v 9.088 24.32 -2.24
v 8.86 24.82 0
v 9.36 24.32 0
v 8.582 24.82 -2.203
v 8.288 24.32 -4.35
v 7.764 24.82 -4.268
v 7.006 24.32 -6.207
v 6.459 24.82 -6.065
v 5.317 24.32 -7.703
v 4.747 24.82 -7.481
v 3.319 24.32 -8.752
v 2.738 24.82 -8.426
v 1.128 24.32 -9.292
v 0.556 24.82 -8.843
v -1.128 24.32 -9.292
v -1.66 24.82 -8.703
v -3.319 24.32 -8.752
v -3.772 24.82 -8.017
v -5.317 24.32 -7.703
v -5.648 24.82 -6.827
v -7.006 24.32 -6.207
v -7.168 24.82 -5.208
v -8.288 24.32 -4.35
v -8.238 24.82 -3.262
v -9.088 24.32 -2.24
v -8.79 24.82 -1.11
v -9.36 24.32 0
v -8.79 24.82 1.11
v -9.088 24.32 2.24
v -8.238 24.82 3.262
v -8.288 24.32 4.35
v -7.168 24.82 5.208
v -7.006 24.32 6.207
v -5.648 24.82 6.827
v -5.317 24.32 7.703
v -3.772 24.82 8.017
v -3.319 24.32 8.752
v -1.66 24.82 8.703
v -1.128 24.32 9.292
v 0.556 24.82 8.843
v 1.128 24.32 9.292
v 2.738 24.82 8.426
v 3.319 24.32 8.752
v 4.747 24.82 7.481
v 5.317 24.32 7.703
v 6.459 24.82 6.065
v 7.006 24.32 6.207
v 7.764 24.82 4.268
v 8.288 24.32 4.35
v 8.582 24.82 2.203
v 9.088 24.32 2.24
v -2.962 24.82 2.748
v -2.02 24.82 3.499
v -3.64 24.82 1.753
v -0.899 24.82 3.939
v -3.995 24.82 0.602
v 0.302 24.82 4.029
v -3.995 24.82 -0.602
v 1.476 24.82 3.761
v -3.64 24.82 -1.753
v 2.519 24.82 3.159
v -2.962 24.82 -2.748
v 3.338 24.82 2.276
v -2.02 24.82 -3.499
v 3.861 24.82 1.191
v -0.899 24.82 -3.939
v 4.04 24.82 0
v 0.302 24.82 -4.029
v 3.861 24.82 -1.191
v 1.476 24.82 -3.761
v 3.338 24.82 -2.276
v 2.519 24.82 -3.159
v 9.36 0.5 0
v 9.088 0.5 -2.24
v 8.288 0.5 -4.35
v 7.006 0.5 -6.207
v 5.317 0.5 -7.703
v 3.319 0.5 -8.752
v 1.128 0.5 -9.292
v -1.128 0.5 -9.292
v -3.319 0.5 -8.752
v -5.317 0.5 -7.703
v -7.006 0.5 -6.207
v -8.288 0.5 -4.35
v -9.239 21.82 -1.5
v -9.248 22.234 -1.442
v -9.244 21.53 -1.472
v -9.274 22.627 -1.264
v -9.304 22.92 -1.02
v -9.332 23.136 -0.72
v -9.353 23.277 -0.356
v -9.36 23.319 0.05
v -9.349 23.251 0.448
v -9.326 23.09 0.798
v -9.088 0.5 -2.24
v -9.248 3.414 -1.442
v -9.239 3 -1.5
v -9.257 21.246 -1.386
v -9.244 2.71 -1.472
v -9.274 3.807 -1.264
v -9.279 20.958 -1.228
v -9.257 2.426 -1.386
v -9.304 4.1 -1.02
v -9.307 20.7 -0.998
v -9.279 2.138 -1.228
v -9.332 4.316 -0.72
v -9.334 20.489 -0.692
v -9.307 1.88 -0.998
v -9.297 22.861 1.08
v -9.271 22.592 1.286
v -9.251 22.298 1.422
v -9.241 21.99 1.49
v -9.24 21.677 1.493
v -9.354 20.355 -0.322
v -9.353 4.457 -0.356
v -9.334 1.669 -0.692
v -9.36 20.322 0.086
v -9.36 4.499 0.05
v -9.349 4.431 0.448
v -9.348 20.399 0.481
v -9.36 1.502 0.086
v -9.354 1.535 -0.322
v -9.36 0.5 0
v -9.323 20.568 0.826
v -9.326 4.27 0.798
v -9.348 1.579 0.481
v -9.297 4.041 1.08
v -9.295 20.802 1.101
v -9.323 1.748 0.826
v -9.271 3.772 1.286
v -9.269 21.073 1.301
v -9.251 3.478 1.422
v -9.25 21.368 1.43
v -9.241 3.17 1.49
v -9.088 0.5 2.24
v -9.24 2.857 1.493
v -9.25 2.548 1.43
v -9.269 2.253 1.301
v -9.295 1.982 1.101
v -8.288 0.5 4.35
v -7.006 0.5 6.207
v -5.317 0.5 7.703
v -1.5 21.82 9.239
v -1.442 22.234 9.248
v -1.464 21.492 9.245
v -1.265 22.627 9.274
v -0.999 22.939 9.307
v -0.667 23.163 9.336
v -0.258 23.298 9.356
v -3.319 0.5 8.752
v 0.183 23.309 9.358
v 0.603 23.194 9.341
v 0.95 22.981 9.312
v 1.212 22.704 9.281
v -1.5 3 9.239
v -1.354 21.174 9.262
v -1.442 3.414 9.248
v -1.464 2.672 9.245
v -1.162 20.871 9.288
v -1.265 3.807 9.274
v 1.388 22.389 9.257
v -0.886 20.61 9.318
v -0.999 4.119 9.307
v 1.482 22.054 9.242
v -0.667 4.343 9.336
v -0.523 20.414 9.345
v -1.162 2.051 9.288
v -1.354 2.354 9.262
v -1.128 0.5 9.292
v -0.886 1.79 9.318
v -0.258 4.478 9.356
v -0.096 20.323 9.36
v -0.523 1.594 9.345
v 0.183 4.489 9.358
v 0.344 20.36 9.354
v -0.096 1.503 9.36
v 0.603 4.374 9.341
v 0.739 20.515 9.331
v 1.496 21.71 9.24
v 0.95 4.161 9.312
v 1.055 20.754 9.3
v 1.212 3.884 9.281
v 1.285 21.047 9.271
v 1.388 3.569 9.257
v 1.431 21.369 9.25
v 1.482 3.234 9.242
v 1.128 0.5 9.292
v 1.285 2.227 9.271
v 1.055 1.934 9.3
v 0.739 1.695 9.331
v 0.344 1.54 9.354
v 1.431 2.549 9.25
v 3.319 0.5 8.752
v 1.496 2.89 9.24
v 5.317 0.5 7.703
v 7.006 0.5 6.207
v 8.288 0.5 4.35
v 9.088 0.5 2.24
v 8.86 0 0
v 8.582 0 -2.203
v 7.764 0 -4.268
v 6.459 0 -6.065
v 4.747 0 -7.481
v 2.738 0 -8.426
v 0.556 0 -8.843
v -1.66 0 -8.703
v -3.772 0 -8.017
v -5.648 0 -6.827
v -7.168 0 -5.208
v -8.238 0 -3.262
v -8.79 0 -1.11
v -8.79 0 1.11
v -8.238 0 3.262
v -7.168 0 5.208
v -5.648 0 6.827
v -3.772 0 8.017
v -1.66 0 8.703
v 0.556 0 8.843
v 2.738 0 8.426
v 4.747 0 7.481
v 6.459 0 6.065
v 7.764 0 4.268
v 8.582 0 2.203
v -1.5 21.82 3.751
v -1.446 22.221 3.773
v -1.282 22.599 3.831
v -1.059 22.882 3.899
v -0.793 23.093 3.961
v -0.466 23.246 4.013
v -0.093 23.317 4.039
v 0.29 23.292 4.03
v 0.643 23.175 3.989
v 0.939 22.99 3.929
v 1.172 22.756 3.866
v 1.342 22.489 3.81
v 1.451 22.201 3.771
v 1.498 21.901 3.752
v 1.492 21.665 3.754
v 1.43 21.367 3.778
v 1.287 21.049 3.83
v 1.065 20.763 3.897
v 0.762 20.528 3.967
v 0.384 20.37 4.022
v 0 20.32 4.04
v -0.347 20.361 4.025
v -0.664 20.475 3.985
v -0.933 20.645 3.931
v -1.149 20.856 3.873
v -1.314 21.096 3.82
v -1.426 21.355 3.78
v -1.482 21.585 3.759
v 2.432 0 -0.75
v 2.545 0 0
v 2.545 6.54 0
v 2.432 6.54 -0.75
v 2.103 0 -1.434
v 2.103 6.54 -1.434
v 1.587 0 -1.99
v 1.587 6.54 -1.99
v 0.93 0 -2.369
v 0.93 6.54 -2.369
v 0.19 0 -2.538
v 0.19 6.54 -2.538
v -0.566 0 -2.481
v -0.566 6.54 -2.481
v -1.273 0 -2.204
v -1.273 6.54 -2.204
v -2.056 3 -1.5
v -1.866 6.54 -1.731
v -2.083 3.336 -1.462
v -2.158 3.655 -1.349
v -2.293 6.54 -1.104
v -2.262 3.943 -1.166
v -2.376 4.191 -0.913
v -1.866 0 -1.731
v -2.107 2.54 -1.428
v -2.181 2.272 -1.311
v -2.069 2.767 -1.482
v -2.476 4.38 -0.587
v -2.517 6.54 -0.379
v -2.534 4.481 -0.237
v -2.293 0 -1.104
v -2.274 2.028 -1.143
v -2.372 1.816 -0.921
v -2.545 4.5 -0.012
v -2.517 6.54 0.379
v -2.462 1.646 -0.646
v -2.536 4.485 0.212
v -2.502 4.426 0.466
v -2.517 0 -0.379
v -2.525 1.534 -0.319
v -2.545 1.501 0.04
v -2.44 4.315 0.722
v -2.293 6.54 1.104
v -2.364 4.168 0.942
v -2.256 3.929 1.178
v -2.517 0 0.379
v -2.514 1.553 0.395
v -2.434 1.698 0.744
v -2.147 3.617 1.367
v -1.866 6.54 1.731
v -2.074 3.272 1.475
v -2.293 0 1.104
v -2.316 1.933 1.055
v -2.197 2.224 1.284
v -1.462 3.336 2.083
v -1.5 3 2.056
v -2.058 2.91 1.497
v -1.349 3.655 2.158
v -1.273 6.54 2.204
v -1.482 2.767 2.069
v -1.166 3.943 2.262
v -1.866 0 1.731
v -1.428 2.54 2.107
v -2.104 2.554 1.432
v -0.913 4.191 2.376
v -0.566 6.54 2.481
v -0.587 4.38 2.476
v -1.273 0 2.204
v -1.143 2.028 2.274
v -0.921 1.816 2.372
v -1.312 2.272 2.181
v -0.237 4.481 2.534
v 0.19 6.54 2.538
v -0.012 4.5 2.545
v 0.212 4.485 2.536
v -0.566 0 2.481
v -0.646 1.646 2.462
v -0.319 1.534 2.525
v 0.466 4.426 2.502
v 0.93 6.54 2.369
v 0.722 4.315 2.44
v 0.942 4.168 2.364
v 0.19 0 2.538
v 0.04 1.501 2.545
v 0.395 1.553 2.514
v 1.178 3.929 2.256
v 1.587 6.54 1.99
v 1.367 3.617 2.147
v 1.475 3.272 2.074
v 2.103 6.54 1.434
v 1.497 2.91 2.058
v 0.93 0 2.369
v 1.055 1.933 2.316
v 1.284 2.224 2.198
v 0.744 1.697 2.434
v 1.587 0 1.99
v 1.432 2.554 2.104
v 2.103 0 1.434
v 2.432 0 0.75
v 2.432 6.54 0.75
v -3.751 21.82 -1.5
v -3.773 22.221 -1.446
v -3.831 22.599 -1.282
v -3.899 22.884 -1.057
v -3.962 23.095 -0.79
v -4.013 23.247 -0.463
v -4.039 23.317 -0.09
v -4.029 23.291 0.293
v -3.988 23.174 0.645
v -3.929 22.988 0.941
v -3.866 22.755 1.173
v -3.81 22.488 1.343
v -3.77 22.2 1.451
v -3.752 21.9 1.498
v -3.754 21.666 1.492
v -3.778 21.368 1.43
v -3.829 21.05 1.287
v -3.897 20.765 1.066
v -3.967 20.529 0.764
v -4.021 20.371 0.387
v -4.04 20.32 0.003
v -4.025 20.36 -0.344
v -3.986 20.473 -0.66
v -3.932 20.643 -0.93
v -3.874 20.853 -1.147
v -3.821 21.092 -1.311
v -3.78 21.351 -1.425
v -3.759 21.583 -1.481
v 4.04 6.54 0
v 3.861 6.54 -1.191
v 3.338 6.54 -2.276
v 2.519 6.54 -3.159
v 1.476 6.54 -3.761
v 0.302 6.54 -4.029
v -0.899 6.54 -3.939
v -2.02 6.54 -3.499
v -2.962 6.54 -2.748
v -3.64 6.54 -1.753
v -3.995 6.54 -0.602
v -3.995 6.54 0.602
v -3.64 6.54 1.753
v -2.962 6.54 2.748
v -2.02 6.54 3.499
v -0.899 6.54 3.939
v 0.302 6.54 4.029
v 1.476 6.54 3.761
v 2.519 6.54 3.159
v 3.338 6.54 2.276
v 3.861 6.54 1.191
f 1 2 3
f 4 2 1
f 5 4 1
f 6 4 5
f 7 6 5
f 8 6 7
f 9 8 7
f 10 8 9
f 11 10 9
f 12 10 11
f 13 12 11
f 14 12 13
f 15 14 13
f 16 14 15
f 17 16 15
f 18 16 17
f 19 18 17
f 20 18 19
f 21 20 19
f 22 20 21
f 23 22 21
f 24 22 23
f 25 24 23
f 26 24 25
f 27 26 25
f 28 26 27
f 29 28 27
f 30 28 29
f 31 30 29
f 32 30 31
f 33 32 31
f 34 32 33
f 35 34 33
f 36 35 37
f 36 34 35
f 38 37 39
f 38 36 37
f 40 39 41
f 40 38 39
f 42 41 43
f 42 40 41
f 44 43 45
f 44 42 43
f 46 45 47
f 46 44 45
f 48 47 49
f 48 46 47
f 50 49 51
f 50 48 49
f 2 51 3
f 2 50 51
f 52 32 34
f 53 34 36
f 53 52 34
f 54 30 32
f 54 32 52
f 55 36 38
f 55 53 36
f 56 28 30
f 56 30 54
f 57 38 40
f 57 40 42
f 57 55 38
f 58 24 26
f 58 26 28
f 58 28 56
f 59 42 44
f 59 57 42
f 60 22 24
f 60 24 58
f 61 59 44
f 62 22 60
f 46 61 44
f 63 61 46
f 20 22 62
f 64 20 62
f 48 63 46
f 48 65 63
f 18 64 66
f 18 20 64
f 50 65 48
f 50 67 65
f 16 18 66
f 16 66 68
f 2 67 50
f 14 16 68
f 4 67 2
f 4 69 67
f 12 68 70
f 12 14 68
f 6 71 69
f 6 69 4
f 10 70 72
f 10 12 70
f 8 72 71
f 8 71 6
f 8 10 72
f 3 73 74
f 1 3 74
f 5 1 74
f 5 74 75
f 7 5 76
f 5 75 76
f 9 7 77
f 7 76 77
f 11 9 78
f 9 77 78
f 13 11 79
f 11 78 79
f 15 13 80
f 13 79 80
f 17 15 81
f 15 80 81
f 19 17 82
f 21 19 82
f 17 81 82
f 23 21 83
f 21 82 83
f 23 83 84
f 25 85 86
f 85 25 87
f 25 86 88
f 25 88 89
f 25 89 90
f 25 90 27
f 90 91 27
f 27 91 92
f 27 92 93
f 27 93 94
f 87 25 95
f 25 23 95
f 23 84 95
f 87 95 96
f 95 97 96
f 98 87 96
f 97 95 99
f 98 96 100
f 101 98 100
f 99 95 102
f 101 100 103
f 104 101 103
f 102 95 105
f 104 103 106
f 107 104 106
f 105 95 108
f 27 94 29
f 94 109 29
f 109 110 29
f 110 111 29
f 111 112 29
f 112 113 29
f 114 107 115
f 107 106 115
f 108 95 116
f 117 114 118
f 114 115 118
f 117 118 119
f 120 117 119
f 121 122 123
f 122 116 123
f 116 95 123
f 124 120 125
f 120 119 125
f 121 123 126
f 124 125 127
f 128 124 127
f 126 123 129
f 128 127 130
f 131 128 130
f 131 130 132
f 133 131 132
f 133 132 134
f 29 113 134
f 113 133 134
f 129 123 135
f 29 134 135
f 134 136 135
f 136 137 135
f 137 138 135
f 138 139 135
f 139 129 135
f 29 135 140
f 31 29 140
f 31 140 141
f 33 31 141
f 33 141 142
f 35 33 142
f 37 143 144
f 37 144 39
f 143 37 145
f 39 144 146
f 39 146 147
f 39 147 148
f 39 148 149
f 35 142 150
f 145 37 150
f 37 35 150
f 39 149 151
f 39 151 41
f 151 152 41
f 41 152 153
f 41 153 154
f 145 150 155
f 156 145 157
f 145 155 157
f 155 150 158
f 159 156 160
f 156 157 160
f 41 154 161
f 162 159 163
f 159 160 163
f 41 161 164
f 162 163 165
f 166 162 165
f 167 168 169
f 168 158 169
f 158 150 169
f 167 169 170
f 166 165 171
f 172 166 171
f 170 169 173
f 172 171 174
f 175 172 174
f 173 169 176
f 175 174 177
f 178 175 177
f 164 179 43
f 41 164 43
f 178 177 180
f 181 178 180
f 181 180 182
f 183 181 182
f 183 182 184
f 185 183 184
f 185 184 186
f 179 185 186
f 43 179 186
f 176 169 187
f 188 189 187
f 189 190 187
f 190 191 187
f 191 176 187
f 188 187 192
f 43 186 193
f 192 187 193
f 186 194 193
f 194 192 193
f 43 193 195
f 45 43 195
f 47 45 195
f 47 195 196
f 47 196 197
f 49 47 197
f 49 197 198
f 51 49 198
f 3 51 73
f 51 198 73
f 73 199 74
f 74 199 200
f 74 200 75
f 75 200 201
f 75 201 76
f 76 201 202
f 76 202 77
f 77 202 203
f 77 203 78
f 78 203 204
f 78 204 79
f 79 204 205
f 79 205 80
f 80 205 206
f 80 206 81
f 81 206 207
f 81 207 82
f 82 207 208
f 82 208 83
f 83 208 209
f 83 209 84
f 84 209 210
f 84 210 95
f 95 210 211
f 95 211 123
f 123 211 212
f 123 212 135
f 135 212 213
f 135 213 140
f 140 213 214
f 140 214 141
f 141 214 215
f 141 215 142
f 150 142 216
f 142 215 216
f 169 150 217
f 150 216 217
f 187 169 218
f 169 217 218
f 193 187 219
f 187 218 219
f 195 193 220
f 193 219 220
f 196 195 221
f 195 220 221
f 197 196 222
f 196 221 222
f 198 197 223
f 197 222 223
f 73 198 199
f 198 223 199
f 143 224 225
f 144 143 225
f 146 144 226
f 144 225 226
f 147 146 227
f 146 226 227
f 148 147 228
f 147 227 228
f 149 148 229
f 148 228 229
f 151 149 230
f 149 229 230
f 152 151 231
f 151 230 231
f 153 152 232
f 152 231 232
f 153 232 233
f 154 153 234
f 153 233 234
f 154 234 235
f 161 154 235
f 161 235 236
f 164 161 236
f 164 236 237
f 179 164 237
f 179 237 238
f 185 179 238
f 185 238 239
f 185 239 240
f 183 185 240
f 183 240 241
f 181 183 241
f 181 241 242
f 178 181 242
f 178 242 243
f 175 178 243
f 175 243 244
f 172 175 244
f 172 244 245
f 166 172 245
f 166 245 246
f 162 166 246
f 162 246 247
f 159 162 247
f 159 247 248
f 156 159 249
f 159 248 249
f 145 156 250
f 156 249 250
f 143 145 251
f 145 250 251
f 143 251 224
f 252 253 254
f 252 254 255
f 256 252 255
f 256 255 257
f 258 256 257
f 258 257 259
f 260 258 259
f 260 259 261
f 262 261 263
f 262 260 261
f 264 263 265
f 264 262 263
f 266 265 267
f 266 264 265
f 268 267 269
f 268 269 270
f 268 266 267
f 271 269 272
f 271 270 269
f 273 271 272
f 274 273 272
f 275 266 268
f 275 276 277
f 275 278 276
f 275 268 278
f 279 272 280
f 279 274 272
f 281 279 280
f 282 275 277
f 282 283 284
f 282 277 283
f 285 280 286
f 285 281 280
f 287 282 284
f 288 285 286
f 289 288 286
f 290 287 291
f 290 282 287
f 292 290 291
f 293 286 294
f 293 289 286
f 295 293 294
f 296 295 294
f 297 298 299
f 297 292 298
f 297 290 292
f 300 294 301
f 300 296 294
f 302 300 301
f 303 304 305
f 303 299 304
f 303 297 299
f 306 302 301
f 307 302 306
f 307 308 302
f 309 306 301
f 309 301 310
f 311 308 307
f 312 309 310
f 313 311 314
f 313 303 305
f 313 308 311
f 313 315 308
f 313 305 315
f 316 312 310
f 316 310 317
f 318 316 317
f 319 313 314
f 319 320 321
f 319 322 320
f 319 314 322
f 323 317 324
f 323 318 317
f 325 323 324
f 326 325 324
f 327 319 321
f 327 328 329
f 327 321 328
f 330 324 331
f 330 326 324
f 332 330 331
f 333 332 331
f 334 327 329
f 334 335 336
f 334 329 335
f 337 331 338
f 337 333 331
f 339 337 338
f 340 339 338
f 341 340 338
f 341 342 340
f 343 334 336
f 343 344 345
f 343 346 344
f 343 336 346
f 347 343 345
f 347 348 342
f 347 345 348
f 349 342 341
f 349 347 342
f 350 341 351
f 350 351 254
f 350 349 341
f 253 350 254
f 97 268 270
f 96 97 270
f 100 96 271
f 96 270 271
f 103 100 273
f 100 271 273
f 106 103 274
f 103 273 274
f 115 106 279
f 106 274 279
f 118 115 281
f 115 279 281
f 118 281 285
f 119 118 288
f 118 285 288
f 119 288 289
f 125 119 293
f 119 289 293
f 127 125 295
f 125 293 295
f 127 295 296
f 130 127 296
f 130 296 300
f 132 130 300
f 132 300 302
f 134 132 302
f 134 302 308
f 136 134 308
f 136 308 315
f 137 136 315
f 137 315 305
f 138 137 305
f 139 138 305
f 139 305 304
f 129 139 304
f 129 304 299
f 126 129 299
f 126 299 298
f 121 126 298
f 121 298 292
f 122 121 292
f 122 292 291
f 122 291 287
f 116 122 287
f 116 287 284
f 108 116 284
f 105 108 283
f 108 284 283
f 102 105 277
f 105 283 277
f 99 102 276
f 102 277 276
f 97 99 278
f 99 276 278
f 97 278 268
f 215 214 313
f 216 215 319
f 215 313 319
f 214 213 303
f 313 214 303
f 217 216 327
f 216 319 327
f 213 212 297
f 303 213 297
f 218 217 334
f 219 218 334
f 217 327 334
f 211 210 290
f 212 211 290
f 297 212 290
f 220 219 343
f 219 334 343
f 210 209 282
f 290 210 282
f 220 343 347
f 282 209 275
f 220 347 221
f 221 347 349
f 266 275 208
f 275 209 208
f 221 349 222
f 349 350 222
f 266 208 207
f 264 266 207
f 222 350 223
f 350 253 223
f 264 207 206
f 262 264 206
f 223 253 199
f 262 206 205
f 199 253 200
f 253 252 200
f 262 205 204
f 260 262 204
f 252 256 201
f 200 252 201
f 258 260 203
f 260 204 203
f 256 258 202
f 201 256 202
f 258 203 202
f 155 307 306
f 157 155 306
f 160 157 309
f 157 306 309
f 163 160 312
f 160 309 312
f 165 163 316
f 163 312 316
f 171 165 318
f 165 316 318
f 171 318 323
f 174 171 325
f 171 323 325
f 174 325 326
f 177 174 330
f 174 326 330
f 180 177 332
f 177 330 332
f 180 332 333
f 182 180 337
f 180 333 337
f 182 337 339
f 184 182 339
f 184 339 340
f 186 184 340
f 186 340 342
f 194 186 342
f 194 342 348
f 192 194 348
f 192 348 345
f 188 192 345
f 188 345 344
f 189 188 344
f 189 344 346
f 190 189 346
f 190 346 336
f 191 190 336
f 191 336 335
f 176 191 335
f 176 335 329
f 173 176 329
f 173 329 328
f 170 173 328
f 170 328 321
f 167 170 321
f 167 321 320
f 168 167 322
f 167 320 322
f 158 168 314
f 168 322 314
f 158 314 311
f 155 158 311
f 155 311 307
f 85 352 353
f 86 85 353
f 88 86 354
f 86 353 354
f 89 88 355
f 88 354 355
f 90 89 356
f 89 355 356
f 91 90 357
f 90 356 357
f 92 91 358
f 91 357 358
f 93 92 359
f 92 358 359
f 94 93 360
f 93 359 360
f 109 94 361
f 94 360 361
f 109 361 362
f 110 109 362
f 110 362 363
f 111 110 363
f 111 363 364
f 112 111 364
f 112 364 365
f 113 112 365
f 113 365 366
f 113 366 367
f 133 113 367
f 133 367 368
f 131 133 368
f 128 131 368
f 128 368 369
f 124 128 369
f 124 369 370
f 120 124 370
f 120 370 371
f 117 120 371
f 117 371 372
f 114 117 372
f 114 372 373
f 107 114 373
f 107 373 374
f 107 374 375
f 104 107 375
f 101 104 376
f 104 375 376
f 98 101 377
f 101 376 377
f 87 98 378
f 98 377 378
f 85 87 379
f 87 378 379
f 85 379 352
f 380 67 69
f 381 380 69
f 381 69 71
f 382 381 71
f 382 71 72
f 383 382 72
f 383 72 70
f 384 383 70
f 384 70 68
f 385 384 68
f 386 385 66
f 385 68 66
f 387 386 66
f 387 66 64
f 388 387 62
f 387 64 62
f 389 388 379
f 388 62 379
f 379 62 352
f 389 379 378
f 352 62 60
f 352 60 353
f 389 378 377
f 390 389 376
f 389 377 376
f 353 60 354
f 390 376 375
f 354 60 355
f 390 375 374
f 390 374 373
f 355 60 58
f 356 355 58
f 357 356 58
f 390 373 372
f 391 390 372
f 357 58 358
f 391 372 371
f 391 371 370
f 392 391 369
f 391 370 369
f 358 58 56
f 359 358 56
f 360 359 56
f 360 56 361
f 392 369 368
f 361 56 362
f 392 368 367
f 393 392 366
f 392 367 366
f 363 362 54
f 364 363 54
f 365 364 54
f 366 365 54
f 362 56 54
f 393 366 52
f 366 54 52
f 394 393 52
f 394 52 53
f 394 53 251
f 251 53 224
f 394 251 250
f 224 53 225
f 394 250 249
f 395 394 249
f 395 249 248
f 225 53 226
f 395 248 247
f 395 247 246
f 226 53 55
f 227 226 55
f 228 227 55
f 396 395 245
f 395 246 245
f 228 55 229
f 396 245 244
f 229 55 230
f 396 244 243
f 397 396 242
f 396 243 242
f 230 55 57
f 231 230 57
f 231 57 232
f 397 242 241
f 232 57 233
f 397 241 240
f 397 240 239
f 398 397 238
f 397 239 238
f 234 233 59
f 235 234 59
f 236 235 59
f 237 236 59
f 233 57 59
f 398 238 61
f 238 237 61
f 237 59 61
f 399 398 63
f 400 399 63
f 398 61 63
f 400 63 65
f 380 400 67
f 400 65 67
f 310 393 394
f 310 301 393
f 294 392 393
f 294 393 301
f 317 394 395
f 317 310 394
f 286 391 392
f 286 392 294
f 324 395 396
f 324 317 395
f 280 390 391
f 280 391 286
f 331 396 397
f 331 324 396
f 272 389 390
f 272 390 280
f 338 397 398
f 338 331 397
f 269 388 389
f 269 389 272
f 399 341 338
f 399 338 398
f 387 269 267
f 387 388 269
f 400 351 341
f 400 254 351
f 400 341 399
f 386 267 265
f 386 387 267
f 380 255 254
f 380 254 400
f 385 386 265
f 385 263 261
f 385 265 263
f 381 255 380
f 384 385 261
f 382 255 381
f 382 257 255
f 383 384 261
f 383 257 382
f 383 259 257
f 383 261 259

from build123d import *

# Parameters (mm, degrees)
SKETCH1_R           = 9.36
BOSS_EXTRUDE1_DEPTH = 24.82
SKETCH2_R           = 2.545
CUT_EXTRUDE1_DEPTH  = 25.82
CUT_EXTRUDE2_START  = 24.82
SKETCH2_3_R         = 4.04
SKETCH2_3_R_2       = 2.545
CUT_EXTRUDE2_DEPTH  = 18.28
CHAMFER1_SIZE       = 0.5
SKETCH3_R           = 1.5
CUT_EXTRUDE3_DEPTH  = 18.28
CIRPATTERN1_COUNT   = 2
CIRPATTERN1_ANGLE   = 90


with BuildPart() as part:
    # Sketch1 → Boss-Extrude1 (new body)
    with BuildSketch(Plane(origin=(0, 0, 0), x_dir=(1, 0, 0), z_dir=(0, 1, 0))):
        Circle(SKETCH1_R)
    extrude(amount=BOSS_EXTRUDE1_DEPTH)

    # Sketch2 → Cut-Extrude1 (cut, through all)
    with BuildSketch(Plane(origin=(0, 0, 0), x_dir=(1, 0, 0), z_dir=(0, 1, 0))):
        Circle(SKETCH2_R)
    extrude(amount=CUT_EXTRUDE1_DEPTH, mode=Mode.SUBTRACT)

    # Sketch2<3> → Cut-Extrude2 (cut)
    with BuildSketch(Plane(origin=(0, 0, 0), x_dir=(1, 0, 0), z_dir=(0, 1, 0)).offset(CUT_EXTRUDE2_START)):
        Circle(SKETCH2_3_R)
        Circle(SKETCH2_3_R_2, mode=Mode.SUBTRACT)
    extrude(amount=-CUT_EXTRUDE2_DEPTH, mode=Mode.SUBTRACT)

    # Chamfer1
    chamfer1_edges = [part.edges().sort_by_distance(p)[0] for p in [
        (-9.36, 0, 0),
        (-9.36, 24.82, 0),
    ]]
    chamfer(chamfer1_edges, length=CHAMFER1_SIZE)

    # Sketch3 → Cut-Extrude3 (cut)
    with BuildSketch(Plane(origin=(0, 0, 0), x_dir=(0, 0, -1), z_dir=(1, 0, 0))):
        with Locations((0, 21.82)):
            Circle(SKETCH3_R)
        with Locations((0, 3)):
            Circle(SKETCH3_R)
    cut_extrude3 = extrude(amount=-CUT_EXTRUDE3_DEPTH, mode=Mode.SUBTRACT)

    # CirPattern1: Cut-Extrude3 ×2 about axis
    cirpattern1_axis = Axis((0, 24.82, 0), (0, 1, 0))
    for i in range(1, CIRPATTERN1_COUNT):
        add(cut_extrude3.rotate(cirpattern1_axis, i * CIRPATTERN1_ANGLE / (CIRPATTERN1_COUNT - 1)), mode=Mode.SUBTRACT)


solid = part.part
